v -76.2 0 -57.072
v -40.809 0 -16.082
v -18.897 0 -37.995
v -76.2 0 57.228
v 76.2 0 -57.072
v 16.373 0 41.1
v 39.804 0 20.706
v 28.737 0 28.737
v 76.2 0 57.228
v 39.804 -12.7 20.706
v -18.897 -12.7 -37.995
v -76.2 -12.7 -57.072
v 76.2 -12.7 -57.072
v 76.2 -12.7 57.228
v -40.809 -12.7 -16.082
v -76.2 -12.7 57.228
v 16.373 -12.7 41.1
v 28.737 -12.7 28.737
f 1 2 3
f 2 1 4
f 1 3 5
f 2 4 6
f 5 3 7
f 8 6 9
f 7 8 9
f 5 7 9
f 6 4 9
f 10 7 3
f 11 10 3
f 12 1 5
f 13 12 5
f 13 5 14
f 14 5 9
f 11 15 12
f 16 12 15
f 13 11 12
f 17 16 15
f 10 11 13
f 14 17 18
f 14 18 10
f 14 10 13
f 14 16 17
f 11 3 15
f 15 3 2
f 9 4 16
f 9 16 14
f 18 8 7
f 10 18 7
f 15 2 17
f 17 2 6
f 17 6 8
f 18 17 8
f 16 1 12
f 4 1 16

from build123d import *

# Parameters (mm, degrees)
F0_W     = 152.4
F0_H     = 114.3
F1_DEPTH = 12.7


with BuildPart() as f1:
    # F0 (on Front) → F1 (new body)
    with BuildSketch(Plane.XZ):
        with Locations((0, 0.077839)):
            Rectangle(F0_W, F0_H)
        Polygon((16.373465, 41.100174), (28.73682, 28.73682), (39.803969, 20.706104), (-18.896834, -37.994699), (-40.809121, -16.082412), align=None, mode=Mode.SUBTRACT)
    extrude(amount=F1_DEPTH)


solid = f1.part
